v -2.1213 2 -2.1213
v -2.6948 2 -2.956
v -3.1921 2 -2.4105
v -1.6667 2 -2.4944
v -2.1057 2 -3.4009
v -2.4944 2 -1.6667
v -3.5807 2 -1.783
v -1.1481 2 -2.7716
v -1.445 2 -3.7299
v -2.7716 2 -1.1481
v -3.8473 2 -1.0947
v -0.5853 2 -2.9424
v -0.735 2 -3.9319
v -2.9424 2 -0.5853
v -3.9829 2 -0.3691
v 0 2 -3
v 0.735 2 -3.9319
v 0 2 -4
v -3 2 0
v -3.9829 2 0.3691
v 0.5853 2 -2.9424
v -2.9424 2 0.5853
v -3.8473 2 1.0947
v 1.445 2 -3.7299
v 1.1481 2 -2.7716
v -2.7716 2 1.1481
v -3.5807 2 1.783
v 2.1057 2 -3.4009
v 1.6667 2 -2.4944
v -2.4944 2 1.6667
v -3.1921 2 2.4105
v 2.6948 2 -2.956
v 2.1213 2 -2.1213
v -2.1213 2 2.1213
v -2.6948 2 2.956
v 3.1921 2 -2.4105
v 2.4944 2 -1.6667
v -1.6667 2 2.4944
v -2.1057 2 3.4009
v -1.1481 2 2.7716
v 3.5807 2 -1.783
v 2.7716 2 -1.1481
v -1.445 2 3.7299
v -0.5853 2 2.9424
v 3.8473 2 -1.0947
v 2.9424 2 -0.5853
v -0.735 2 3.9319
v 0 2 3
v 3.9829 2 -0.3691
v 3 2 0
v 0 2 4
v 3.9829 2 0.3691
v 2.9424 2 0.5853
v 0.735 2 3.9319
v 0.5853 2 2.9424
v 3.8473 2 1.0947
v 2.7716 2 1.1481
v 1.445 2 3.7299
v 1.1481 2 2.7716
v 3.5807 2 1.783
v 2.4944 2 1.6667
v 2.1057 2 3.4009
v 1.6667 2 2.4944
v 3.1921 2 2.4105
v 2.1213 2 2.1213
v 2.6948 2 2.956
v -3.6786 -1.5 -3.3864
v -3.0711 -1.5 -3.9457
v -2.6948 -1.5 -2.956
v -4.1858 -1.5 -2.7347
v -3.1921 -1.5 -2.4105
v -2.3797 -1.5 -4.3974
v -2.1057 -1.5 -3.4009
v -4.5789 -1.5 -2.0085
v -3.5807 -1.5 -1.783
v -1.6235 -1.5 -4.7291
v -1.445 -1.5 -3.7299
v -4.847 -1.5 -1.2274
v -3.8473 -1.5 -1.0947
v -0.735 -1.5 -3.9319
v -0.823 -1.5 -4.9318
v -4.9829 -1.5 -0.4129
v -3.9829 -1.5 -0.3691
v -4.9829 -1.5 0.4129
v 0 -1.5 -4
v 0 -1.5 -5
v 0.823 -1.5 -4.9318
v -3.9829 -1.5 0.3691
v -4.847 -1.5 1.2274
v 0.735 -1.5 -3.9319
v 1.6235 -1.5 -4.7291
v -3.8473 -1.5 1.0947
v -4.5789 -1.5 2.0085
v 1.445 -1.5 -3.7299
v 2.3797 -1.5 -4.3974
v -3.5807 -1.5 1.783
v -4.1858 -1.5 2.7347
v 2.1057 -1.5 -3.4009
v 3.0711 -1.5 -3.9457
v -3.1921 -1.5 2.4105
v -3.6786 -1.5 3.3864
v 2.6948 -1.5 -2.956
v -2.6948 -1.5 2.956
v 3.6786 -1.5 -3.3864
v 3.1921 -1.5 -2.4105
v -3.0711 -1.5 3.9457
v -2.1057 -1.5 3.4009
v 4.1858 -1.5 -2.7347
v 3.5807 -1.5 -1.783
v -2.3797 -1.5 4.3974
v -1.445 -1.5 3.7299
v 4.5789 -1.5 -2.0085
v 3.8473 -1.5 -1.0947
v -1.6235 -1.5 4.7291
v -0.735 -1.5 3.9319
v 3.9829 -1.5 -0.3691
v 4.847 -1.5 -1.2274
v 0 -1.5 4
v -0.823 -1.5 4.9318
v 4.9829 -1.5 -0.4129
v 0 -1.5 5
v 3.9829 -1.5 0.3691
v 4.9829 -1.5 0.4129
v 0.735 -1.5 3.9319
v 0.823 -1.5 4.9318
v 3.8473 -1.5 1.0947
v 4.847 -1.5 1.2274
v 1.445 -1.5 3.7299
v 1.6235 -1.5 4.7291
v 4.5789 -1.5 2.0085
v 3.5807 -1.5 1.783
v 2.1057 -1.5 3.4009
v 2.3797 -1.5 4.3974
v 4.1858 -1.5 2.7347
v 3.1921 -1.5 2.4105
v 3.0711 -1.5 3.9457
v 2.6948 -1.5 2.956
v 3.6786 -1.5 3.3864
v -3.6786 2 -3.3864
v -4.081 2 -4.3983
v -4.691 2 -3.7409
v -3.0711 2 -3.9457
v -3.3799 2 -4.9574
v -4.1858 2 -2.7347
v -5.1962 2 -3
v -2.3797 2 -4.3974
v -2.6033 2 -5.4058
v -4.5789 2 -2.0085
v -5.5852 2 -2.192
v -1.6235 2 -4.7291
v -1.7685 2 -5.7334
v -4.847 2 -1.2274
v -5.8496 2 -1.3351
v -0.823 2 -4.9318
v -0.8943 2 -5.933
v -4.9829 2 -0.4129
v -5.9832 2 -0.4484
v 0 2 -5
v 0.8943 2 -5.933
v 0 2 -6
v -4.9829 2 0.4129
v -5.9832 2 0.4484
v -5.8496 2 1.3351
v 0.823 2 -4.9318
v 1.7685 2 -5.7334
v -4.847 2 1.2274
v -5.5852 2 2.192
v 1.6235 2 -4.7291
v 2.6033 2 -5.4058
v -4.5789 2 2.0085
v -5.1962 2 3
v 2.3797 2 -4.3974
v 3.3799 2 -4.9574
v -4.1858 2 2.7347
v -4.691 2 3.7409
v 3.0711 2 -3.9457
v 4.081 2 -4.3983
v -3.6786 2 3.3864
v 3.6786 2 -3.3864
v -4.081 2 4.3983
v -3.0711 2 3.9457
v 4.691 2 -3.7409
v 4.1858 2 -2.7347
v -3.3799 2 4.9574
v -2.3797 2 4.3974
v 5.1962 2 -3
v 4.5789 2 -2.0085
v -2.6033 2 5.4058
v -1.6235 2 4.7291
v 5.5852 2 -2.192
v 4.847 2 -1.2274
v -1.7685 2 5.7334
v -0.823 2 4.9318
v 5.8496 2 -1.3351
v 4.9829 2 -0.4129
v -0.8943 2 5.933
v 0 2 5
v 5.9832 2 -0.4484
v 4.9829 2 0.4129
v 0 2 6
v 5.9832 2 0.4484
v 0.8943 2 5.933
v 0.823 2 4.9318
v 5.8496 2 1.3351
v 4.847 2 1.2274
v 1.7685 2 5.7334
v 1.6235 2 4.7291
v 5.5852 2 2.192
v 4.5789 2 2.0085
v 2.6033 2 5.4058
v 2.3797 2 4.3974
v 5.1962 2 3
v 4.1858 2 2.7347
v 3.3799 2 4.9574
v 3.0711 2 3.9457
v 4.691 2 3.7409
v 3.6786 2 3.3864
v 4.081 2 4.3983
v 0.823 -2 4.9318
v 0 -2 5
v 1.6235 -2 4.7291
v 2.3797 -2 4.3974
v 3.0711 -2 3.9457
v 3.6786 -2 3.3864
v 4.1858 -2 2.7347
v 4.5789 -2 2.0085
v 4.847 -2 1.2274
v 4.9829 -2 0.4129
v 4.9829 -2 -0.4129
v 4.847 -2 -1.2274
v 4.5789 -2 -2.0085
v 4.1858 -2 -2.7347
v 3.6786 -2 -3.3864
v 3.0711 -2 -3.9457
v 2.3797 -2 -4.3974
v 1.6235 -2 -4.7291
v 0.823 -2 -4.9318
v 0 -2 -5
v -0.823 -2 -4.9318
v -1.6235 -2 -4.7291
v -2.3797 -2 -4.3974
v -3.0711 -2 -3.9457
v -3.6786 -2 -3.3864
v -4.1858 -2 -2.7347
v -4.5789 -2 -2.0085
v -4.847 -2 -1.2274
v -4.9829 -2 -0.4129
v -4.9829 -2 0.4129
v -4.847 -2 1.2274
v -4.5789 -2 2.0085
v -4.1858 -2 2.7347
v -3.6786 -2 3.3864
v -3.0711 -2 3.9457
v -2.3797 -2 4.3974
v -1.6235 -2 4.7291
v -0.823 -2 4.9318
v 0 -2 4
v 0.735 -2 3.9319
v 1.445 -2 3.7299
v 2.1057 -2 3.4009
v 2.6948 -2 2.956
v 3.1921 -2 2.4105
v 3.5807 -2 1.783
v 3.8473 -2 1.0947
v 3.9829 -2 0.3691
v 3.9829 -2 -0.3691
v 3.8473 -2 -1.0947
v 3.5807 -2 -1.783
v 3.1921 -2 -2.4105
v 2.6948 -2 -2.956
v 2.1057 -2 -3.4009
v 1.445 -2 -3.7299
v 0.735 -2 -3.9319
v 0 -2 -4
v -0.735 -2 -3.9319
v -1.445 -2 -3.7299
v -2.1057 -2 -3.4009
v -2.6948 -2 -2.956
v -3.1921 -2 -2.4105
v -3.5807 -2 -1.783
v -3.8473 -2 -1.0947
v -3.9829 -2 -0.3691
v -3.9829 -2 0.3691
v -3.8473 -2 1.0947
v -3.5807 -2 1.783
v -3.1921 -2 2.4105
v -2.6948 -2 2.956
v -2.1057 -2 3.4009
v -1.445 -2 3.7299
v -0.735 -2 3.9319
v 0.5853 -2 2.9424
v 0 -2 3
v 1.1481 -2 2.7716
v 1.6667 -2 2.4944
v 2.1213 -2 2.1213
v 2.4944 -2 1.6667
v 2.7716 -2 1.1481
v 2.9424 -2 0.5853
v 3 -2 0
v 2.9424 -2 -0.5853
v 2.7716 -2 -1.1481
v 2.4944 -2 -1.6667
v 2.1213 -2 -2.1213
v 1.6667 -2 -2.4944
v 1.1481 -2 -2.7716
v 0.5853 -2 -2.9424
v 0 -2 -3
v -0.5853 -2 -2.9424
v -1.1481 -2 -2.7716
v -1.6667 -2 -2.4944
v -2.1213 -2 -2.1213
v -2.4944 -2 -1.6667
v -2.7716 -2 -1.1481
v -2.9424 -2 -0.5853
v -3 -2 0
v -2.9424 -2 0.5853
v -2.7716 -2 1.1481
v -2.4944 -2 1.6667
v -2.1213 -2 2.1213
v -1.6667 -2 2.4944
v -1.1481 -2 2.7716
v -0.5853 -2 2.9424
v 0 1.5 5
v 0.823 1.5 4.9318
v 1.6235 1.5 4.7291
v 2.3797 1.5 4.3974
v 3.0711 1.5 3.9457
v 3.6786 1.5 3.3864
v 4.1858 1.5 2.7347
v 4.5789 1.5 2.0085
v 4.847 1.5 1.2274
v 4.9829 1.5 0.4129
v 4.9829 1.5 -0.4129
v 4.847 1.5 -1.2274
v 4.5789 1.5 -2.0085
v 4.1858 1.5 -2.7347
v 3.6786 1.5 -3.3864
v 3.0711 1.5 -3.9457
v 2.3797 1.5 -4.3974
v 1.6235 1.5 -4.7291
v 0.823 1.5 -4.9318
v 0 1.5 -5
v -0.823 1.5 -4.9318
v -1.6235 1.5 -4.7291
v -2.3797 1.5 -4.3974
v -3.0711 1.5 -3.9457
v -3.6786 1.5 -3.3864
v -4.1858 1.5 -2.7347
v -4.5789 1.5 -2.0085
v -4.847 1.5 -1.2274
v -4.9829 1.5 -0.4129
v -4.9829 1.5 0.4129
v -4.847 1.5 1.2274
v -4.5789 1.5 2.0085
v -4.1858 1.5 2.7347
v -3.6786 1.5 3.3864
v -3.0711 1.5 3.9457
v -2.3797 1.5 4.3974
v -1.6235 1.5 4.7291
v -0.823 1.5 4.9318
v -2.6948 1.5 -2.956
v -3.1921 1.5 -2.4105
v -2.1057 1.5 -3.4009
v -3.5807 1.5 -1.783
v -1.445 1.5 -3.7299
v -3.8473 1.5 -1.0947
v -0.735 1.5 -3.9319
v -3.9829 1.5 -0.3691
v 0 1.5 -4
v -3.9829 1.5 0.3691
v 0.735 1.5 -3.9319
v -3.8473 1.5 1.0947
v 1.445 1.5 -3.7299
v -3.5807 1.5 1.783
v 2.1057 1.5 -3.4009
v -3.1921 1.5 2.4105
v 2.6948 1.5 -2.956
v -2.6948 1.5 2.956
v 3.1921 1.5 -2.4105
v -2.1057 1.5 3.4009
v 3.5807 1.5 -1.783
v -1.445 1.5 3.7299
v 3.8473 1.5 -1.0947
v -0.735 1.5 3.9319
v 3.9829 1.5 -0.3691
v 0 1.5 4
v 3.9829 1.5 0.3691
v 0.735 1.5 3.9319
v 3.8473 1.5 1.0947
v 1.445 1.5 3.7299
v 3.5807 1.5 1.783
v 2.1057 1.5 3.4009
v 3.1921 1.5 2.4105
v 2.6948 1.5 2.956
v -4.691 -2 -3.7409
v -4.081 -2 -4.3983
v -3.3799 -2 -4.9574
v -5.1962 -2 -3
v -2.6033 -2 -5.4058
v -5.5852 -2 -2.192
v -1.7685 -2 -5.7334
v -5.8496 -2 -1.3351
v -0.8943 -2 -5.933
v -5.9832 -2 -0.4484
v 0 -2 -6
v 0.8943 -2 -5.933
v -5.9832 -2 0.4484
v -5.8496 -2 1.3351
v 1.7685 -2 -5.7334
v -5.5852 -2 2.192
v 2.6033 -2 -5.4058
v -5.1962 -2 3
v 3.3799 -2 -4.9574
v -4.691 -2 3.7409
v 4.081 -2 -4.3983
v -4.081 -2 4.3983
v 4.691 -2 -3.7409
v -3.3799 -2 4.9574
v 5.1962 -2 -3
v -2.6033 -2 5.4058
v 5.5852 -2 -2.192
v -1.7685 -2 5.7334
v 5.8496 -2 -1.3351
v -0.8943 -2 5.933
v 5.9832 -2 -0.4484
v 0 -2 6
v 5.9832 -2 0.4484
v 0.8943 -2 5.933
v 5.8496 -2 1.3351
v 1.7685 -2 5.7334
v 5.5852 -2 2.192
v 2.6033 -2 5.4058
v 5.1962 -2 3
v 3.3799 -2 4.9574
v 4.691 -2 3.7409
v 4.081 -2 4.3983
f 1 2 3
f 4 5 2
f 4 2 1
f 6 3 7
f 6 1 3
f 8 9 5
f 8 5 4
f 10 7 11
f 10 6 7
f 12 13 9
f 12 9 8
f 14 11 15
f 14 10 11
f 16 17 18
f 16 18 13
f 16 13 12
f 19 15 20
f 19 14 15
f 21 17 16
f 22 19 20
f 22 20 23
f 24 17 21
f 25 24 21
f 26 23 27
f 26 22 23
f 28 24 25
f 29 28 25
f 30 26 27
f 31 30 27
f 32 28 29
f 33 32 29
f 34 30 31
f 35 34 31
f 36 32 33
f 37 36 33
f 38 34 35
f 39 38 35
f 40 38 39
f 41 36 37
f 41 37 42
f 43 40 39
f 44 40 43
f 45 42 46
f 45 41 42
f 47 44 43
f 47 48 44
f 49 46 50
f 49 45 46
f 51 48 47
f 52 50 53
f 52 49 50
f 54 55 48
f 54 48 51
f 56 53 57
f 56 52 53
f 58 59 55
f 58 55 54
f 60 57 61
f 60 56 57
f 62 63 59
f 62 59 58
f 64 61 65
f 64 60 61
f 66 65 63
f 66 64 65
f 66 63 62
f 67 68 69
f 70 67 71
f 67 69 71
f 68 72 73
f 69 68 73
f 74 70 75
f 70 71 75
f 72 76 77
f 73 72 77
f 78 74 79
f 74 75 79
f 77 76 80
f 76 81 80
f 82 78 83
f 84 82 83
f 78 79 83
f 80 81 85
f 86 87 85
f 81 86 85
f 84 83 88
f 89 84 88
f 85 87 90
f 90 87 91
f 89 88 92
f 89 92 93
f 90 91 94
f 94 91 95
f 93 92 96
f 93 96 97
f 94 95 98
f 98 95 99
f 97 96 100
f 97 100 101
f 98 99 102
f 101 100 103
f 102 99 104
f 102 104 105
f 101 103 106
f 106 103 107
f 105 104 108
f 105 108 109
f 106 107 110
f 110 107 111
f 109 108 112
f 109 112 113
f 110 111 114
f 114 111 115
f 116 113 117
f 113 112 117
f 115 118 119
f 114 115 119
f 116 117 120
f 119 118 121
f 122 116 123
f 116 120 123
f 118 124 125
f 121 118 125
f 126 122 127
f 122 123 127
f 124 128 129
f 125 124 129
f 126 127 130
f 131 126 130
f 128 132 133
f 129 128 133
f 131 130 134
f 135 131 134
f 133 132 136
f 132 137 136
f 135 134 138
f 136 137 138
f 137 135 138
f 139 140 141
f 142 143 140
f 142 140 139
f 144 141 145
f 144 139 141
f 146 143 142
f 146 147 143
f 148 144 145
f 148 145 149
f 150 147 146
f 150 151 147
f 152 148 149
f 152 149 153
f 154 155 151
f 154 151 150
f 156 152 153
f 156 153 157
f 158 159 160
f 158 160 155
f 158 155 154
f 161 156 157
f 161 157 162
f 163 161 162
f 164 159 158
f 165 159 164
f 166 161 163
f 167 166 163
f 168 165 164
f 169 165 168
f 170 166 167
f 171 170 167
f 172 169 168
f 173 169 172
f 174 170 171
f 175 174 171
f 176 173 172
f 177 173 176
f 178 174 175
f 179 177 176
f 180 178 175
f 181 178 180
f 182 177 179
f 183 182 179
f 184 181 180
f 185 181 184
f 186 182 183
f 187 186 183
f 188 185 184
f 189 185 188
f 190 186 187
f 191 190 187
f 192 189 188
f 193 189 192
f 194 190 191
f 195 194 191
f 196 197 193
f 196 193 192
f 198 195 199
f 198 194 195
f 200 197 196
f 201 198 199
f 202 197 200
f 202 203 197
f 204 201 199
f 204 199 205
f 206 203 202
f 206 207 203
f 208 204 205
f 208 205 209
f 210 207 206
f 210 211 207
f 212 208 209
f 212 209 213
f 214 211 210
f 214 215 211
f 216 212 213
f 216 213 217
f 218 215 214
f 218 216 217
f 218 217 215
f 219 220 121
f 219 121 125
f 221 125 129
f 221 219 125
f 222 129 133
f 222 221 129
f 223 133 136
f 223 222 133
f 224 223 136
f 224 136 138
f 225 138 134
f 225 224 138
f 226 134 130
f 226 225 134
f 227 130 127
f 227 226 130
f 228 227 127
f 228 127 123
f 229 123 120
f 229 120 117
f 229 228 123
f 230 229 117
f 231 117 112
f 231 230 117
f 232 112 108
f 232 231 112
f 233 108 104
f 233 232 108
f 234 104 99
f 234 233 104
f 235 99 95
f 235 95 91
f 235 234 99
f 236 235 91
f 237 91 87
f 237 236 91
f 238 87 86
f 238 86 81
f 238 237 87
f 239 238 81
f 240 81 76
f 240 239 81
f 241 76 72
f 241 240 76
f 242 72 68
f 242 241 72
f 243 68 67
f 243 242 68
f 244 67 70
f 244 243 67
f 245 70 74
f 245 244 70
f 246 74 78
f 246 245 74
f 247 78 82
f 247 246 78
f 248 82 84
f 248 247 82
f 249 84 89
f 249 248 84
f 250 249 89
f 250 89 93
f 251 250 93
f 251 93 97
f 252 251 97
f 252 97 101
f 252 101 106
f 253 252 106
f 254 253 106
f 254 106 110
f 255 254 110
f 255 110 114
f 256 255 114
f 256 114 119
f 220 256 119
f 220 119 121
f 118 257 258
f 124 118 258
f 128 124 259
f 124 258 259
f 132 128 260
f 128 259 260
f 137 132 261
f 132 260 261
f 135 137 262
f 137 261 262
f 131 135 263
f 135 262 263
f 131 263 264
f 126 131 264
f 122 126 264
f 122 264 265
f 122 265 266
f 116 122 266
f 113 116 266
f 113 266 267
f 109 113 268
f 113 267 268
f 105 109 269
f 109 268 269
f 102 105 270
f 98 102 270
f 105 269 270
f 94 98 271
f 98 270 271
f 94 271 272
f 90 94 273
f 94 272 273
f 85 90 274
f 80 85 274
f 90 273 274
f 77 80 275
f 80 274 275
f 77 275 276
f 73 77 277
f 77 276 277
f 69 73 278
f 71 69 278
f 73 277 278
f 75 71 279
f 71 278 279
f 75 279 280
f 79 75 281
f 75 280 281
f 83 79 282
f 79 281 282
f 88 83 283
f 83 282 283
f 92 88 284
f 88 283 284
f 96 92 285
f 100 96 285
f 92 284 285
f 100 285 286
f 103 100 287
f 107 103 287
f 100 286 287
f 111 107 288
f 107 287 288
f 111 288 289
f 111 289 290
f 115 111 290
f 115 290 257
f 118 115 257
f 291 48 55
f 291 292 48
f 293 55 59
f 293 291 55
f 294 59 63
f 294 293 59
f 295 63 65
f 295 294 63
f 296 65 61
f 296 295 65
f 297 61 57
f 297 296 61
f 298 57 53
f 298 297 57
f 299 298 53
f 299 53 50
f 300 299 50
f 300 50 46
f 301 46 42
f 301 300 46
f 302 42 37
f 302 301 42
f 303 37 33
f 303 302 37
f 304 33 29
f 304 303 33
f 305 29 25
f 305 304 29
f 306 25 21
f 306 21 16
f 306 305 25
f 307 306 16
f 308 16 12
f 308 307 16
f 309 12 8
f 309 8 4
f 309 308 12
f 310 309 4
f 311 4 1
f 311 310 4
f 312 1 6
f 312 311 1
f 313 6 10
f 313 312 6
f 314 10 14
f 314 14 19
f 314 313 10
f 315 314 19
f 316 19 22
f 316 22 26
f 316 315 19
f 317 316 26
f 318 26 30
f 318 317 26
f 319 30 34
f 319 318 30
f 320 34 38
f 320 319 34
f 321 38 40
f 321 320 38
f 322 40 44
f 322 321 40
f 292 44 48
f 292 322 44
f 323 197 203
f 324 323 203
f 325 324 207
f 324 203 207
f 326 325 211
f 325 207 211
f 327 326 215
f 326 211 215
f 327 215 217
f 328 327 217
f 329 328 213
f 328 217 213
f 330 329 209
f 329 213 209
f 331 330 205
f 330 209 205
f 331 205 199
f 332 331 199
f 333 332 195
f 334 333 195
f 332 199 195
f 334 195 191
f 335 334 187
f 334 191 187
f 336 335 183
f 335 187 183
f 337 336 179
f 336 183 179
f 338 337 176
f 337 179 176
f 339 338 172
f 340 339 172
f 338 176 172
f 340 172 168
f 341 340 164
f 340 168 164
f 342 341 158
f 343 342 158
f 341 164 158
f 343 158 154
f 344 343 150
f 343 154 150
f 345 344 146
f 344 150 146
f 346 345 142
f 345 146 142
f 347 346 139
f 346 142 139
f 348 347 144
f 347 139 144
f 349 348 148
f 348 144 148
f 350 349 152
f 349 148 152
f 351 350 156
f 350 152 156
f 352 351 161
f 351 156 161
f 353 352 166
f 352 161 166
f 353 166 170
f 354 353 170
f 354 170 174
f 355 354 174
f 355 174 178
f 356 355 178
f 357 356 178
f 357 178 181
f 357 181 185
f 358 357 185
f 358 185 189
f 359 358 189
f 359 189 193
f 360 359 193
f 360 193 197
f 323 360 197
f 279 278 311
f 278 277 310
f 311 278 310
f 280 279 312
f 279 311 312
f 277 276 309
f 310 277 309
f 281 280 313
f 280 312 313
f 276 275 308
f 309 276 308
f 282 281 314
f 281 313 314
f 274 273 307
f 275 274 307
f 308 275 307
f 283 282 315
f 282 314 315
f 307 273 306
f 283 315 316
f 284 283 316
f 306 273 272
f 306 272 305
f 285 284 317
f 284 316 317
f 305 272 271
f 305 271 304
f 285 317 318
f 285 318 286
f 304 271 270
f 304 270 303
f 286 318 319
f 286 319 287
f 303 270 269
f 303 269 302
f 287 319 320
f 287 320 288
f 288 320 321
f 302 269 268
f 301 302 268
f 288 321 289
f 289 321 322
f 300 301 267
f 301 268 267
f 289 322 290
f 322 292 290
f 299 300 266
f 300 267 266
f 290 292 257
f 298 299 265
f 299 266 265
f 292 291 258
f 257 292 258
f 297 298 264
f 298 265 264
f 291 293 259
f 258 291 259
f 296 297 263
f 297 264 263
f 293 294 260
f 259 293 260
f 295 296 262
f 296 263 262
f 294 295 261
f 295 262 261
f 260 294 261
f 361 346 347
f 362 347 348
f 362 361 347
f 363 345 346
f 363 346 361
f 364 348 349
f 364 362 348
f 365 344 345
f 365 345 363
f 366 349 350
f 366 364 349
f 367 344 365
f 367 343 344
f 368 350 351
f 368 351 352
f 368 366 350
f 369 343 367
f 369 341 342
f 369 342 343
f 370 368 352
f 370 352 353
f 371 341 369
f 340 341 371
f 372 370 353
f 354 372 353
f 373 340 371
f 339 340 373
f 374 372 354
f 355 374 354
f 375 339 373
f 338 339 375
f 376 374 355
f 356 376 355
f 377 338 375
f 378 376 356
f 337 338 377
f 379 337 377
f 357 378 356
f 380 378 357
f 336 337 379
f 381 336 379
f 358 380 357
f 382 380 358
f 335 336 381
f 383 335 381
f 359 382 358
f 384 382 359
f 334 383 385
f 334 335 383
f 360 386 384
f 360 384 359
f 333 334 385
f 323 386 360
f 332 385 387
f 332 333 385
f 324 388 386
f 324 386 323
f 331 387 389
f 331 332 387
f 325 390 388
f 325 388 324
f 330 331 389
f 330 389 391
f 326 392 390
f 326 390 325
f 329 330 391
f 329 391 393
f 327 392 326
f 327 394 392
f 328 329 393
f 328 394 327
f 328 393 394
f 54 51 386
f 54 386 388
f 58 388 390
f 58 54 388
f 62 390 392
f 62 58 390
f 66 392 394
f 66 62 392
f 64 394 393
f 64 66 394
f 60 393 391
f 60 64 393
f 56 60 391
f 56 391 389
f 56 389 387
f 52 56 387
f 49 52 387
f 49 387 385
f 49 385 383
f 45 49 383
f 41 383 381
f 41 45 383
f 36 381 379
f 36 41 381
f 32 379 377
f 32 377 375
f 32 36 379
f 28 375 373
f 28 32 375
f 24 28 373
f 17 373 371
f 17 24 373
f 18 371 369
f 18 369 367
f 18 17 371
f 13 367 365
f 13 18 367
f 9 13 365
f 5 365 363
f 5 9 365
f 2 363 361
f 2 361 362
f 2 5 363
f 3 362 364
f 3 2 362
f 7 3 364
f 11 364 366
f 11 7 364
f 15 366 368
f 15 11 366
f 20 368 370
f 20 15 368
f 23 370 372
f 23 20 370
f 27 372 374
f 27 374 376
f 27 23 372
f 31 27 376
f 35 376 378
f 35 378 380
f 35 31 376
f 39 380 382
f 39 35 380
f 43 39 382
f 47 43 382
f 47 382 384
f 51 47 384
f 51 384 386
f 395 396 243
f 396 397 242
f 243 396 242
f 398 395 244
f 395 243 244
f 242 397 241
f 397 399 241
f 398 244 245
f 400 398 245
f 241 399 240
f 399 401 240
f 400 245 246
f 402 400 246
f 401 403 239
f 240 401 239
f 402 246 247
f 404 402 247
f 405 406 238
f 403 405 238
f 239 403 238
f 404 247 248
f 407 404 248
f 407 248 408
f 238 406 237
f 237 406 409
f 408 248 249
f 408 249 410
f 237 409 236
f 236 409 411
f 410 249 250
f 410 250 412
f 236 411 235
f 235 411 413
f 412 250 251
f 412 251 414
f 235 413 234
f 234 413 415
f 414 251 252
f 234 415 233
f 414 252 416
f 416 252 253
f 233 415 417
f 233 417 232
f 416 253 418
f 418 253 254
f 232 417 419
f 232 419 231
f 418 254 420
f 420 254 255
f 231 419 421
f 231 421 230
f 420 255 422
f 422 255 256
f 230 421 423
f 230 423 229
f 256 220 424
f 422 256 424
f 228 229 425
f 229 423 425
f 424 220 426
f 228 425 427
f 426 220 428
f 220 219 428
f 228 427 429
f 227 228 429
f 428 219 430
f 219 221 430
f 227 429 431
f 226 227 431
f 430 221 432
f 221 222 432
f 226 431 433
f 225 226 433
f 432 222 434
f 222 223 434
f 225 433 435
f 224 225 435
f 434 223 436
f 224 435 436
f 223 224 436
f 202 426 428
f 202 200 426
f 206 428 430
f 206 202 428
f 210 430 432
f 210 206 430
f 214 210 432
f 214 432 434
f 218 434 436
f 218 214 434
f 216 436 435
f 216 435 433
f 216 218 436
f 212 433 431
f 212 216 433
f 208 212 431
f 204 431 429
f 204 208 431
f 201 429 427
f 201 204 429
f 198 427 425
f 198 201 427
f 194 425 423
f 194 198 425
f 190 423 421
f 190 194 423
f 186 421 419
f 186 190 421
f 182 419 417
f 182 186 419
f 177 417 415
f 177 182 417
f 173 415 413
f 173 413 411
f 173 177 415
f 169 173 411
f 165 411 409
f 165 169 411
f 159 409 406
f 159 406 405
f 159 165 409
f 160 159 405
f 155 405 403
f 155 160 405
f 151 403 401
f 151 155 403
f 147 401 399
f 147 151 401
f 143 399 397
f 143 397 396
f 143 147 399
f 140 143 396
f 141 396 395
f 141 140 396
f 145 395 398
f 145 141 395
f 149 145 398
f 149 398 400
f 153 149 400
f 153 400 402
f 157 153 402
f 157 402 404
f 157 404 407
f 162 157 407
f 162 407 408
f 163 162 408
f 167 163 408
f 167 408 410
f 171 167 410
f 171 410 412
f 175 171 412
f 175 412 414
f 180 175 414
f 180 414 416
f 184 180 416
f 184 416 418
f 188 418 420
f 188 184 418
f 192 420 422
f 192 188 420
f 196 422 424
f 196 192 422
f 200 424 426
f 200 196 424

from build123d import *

# Parameters (mm, degrees)
SKETCH_1_R          = 6
SKETCH_1_R_2        = 3
EXTRUDE_1_DEPTH     = 2
SKETCH_2_R          = 5
SKETCH_2_R_2        = 4
CUT_EXTRUDE_1_DEPTH = 0.5


with BuildPart() as part:
    # 草图1 → 凸台-拉伸1 (new, symmetric)
    with BuildSketch(Plane(origin=(0, 0, 0), x_dir=(1, 0, 0), z_dir=(0, 1, 0))):
        with Locations(Location((0, 0, 0), (0, 0, 270))):
            Circle(SKETCH_1_R)
        with Locations(Location((0, 0, 0), (0, 0, 270))):
            Circle(SKETCH_1_R_2, mode=Mode.SUBTRACT)
    extrude(amount=EXTRUDE_1_DEPTH, both=True)

    # 草图2 → 切除-拉伸1 (cut)
    with BuildSketch(Plane(origin=(0, 2, 0), x_dir=(1, 0, 0), z_dir=(0, 1, 0))):
        with Locations(Location((0, 0, 0), (0, 0, 270))):
            Circle(SKETCH_2_R)
        with Locations(Location((0, 0, 0), (0, 0, 270))):
            Circle(SKETCH_2_R_2, mode=Mode.SUBTRACT)
    cut_extrude_1 = extrude(amount=-CUT_EXTRUDE_1_DEPTH, mode=Mode.SUBTRACT)

    # 镜向1: 切除-拉伸1 across plane
    add(cut_extrude_1.mirror(Plane.ZX), mode=Mode.SUBTRACT)


solid = part.part
